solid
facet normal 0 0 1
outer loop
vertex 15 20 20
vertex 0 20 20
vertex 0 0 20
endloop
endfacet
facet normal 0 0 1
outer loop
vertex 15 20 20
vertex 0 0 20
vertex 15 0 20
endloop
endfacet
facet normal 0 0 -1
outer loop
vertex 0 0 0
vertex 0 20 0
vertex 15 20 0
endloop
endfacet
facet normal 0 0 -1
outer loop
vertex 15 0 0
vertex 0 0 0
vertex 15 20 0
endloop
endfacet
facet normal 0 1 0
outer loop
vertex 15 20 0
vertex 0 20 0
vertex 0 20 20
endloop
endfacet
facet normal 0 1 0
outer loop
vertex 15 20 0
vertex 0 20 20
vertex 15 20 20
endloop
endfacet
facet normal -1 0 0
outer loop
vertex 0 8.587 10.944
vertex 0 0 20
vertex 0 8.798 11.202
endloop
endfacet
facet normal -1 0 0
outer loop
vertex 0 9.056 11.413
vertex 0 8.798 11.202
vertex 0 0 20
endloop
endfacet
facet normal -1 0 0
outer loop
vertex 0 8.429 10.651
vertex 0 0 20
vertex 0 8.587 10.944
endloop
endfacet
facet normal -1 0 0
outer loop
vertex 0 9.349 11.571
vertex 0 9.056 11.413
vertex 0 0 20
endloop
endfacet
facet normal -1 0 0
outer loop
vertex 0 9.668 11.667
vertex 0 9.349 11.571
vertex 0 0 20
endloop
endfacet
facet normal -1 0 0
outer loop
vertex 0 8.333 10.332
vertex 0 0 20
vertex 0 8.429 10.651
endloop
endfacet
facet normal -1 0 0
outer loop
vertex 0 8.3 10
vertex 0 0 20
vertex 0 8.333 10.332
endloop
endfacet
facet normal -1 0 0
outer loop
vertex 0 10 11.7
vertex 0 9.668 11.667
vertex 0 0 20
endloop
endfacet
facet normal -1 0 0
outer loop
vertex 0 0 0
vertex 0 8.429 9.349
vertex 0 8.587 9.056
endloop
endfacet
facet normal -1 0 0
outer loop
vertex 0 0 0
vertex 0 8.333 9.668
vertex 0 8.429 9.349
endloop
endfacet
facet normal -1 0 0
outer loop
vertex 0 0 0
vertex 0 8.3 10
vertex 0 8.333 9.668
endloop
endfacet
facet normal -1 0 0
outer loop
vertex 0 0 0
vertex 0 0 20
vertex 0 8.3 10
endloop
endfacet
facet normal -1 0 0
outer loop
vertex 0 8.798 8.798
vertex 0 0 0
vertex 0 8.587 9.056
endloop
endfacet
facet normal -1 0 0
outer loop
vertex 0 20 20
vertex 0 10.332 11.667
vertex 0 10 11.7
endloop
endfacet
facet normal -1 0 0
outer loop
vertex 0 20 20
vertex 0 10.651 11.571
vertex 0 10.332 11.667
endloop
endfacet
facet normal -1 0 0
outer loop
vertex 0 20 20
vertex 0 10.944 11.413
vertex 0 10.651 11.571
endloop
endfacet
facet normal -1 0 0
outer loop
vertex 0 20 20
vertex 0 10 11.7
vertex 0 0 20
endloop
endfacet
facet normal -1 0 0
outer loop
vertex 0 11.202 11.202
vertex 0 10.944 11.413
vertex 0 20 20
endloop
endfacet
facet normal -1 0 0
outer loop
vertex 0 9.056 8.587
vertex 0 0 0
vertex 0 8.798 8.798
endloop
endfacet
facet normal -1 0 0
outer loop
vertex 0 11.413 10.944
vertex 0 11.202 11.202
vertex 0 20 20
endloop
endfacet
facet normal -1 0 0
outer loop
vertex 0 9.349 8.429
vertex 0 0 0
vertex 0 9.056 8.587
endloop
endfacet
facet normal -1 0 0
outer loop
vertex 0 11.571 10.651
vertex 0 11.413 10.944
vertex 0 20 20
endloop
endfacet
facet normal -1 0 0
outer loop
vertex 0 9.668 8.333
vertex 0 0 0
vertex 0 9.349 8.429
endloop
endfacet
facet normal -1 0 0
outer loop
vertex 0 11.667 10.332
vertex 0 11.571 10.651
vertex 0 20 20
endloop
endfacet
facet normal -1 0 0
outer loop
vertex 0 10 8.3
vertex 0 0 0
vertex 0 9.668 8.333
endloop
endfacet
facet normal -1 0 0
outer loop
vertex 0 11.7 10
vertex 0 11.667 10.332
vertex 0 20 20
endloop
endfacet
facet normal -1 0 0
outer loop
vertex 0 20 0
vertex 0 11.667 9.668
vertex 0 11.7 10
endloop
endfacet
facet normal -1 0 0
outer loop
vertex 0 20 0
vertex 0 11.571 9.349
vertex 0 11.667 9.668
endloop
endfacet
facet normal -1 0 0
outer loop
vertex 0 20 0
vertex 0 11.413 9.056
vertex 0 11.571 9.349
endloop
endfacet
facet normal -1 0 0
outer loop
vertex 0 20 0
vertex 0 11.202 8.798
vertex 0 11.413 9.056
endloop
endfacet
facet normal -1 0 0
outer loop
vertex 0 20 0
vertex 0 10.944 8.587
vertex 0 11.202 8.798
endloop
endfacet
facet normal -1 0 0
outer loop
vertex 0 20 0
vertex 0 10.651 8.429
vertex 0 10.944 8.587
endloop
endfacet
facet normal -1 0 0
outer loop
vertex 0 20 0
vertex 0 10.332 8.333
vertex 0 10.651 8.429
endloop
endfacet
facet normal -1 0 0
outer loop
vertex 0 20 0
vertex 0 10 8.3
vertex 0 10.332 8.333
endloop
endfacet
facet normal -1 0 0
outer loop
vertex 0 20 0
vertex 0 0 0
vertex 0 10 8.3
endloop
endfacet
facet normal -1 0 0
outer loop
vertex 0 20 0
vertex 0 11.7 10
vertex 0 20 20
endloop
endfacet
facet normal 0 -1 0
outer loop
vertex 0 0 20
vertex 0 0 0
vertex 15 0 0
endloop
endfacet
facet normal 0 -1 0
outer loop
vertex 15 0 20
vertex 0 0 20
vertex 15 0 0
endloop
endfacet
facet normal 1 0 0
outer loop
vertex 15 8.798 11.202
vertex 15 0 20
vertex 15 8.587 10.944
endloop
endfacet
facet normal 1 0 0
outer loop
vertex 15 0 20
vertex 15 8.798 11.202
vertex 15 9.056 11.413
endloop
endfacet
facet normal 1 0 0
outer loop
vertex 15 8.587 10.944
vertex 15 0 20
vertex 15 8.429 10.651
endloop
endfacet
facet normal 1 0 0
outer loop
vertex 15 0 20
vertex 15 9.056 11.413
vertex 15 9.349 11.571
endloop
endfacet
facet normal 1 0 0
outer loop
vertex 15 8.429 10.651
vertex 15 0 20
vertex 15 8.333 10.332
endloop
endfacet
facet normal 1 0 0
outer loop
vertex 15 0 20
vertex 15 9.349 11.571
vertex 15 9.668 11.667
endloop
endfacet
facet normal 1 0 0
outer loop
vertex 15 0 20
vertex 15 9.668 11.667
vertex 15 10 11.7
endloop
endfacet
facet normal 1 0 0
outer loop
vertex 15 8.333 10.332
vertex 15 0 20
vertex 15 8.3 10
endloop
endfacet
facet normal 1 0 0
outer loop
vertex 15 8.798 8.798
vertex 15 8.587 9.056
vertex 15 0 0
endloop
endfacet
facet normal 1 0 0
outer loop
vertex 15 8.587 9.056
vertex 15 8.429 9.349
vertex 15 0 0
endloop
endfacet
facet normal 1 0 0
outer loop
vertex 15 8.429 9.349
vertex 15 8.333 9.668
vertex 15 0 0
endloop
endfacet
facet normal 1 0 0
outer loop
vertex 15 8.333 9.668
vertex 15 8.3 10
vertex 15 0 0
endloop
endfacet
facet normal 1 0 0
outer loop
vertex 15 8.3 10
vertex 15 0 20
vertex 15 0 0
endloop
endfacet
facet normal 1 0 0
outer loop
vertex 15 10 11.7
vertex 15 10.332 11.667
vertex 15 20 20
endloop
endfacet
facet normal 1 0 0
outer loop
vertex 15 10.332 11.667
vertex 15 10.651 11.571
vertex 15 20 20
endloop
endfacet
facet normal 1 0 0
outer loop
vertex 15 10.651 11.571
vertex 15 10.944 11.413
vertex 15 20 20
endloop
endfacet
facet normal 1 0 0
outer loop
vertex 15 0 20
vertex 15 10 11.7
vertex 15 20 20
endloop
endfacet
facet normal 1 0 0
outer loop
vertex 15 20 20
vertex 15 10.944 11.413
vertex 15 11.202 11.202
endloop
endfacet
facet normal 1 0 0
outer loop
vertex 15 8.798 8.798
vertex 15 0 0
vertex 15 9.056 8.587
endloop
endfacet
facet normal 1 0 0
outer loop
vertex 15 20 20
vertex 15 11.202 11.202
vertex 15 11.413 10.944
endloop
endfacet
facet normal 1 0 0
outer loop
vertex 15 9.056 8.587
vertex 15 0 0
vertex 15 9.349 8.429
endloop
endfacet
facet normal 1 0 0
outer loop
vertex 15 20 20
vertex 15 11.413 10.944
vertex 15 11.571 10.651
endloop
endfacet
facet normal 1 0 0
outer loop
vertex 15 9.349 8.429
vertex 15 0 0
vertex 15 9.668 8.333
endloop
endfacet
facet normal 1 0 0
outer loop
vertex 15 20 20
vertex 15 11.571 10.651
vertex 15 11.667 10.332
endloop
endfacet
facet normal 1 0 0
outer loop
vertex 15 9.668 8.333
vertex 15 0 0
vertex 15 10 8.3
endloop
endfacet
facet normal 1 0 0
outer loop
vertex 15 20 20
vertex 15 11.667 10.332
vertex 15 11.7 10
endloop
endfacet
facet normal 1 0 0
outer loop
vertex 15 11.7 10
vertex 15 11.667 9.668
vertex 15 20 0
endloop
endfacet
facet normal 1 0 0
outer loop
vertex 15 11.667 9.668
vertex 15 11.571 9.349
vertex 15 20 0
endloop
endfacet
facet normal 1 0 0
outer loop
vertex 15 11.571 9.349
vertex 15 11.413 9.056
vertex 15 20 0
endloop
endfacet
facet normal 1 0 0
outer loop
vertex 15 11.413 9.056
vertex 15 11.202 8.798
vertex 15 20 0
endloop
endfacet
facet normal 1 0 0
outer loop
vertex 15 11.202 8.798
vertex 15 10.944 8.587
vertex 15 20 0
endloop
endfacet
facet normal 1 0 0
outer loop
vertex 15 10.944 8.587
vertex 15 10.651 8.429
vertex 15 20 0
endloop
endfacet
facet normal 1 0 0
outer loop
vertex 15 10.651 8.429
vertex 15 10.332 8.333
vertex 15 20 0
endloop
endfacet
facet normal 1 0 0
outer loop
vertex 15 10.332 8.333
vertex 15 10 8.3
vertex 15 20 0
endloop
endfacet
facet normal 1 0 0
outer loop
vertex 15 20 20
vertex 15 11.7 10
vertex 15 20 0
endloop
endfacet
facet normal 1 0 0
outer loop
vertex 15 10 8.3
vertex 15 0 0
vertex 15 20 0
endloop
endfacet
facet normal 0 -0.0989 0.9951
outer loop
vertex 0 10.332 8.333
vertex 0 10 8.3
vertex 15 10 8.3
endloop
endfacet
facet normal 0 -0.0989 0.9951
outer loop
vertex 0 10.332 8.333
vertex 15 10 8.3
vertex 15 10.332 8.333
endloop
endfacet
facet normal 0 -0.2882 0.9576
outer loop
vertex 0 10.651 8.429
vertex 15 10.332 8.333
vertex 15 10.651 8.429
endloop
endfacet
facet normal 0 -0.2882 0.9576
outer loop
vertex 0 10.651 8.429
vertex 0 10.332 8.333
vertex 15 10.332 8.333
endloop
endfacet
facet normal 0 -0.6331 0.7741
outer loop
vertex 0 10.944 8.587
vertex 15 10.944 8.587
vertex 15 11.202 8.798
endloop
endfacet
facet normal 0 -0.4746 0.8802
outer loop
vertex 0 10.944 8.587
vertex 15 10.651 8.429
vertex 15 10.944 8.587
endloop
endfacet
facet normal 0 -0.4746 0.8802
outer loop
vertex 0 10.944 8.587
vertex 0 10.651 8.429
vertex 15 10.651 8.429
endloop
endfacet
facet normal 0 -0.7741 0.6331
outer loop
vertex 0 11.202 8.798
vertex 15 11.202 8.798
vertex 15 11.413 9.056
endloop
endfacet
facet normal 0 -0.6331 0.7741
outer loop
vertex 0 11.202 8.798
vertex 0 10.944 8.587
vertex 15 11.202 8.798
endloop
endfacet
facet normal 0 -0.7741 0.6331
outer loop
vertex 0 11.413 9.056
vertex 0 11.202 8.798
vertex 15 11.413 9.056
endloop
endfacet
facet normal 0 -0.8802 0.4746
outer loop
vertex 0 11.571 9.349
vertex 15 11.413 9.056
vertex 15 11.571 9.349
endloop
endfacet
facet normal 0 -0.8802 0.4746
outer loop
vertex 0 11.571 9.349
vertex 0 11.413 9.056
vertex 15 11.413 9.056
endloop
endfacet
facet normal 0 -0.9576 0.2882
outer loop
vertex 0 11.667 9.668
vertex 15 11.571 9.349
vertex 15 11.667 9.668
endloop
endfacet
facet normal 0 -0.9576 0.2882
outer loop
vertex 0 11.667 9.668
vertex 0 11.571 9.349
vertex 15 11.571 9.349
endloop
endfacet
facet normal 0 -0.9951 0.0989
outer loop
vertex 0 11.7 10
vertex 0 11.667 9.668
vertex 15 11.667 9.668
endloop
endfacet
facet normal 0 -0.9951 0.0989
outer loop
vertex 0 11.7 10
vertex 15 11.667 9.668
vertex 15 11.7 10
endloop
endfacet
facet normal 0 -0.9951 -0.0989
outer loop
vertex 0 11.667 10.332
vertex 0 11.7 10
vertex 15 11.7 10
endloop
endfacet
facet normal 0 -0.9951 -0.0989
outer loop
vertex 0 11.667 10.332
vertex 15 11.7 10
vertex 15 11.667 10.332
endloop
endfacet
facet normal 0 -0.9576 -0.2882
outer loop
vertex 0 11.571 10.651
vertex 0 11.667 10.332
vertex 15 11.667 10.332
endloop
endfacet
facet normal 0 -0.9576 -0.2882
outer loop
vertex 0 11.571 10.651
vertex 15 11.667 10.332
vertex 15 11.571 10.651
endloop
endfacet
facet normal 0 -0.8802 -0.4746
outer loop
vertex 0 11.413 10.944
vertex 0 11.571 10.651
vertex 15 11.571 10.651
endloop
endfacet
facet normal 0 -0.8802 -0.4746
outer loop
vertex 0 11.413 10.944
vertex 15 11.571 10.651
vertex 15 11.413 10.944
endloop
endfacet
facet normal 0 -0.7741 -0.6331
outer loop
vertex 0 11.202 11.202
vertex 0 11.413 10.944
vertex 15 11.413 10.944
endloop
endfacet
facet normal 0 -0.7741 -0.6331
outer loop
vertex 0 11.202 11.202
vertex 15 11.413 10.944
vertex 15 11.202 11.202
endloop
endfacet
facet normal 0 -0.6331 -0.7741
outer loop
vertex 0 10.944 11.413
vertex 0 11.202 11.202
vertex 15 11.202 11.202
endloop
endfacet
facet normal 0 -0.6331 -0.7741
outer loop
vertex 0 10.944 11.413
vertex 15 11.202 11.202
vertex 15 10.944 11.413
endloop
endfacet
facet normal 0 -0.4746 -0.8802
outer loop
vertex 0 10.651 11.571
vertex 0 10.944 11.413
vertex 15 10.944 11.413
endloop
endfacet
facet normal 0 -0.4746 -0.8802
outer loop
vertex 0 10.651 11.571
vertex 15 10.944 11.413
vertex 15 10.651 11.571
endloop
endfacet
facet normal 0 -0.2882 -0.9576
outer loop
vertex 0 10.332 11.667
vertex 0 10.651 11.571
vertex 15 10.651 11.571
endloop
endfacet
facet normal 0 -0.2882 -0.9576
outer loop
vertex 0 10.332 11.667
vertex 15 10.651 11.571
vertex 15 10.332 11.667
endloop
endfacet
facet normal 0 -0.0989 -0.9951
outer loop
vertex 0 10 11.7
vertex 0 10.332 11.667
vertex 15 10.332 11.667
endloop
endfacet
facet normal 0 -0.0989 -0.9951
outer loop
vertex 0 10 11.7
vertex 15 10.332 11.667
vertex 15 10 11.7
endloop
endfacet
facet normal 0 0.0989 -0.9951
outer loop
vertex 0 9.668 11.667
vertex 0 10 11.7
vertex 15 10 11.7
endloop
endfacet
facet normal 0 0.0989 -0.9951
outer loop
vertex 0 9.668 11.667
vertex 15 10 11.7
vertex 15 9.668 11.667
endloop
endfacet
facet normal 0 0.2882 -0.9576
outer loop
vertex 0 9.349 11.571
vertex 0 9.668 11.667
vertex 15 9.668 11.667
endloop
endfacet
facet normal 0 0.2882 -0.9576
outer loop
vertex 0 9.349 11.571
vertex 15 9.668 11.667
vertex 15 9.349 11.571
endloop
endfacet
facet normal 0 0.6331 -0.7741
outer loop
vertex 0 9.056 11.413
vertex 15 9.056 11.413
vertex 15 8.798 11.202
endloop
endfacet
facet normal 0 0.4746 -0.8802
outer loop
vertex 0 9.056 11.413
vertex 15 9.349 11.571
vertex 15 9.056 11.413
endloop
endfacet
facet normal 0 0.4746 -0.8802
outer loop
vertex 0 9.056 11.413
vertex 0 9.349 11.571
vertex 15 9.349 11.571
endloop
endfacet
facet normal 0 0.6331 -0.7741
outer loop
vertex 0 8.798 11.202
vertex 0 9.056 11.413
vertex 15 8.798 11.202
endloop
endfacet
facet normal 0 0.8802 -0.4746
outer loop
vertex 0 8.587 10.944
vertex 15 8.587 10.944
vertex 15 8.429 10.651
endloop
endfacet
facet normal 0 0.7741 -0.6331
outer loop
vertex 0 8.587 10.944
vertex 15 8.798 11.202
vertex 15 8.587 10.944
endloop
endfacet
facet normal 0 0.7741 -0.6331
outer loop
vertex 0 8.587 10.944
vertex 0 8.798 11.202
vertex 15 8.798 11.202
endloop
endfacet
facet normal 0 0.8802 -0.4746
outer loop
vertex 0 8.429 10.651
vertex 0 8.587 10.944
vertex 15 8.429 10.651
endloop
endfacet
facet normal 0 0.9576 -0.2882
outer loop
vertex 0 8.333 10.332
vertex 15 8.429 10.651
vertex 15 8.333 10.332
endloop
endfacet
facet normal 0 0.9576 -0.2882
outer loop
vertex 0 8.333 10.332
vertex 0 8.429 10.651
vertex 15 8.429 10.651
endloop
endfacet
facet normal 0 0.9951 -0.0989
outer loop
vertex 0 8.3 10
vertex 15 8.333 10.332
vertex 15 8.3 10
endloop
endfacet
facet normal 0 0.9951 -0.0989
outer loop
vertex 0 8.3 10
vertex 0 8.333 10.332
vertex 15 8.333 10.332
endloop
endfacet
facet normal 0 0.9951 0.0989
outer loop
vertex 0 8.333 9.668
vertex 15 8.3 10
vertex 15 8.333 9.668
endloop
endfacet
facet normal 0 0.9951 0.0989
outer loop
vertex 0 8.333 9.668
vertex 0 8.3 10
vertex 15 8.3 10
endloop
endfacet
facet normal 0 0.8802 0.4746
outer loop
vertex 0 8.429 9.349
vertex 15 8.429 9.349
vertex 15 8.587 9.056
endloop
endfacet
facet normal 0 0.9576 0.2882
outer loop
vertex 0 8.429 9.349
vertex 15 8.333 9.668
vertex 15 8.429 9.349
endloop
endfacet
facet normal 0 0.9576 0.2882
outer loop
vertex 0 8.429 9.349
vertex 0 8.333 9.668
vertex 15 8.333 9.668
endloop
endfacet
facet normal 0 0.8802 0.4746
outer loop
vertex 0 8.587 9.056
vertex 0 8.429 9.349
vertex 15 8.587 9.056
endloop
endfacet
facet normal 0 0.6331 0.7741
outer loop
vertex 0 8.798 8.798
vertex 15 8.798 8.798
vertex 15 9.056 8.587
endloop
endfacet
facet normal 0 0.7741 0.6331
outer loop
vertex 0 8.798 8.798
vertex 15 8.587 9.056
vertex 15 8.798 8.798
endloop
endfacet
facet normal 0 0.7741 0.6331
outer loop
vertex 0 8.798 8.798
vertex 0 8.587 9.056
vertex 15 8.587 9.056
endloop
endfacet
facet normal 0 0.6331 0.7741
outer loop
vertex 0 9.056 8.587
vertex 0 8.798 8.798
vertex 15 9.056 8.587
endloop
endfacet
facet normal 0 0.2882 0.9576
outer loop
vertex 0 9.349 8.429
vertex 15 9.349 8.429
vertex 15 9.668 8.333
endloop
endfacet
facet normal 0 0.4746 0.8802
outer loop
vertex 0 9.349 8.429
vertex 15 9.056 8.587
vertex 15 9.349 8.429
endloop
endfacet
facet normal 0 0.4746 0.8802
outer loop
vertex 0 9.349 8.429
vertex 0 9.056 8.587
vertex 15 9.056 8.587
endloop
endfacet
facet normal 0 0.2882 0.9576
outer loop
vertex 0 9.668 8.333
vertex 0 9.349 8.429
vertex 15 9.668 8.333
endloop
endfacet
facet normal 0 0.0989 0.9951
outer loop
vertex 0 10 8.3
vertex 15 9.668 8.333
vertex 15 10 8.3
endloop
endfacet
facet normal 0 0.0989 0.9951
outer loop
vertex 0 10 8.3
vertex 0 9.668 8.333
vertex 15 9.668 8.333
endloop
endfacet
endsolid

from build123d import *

# Parameters (mm, degrees)
CYLINDER017_R           = 1.7
CYLINDER017_DEPTH       = 80
CYLINDER017_PITCH_ANGLE = 90
BOX_W                   = 15
BOX_H                   = 20
BOX_DEPTH               = 20


with BuildPart() as taladro_tornillo010:
    # Cylinder017 → Cylinder017 (new body)
    with BuildSketch(Plane.XY):
        Circle(CYLINDER017_R)
    extrude(amount=CYLINDER017_DEPTH)


with BuildPart() as taladro_tornillo010_1:
    # Cylinder017 pitch: moved
    add(taladro_tornillo010.part.rotate(Axis((0, 0, 0), (0, 1, 0)), CYLINDER017_PITCH_ANGLE))


with BuildPart() as taladro_tornillo010_2:
    # Cylinder017 placement: moved
    add(taladro_tornillo010_1.part.moved(Location((-20, 10, 10))))


with BuildPart() as cut:
    # Box → Box (new body)
    with BuildSketch(Plane.XY):
        with Locations((7.5, 10)):
            Rectangle(BOX_W, BOX_H)
    extrude(amount=BOX_DEPTH)

    # Cut: cut Taladro tornillo010
    add(taladro_tornillo010_2.part, mode=Mode.SUBTRACT)


solid = cut.part
